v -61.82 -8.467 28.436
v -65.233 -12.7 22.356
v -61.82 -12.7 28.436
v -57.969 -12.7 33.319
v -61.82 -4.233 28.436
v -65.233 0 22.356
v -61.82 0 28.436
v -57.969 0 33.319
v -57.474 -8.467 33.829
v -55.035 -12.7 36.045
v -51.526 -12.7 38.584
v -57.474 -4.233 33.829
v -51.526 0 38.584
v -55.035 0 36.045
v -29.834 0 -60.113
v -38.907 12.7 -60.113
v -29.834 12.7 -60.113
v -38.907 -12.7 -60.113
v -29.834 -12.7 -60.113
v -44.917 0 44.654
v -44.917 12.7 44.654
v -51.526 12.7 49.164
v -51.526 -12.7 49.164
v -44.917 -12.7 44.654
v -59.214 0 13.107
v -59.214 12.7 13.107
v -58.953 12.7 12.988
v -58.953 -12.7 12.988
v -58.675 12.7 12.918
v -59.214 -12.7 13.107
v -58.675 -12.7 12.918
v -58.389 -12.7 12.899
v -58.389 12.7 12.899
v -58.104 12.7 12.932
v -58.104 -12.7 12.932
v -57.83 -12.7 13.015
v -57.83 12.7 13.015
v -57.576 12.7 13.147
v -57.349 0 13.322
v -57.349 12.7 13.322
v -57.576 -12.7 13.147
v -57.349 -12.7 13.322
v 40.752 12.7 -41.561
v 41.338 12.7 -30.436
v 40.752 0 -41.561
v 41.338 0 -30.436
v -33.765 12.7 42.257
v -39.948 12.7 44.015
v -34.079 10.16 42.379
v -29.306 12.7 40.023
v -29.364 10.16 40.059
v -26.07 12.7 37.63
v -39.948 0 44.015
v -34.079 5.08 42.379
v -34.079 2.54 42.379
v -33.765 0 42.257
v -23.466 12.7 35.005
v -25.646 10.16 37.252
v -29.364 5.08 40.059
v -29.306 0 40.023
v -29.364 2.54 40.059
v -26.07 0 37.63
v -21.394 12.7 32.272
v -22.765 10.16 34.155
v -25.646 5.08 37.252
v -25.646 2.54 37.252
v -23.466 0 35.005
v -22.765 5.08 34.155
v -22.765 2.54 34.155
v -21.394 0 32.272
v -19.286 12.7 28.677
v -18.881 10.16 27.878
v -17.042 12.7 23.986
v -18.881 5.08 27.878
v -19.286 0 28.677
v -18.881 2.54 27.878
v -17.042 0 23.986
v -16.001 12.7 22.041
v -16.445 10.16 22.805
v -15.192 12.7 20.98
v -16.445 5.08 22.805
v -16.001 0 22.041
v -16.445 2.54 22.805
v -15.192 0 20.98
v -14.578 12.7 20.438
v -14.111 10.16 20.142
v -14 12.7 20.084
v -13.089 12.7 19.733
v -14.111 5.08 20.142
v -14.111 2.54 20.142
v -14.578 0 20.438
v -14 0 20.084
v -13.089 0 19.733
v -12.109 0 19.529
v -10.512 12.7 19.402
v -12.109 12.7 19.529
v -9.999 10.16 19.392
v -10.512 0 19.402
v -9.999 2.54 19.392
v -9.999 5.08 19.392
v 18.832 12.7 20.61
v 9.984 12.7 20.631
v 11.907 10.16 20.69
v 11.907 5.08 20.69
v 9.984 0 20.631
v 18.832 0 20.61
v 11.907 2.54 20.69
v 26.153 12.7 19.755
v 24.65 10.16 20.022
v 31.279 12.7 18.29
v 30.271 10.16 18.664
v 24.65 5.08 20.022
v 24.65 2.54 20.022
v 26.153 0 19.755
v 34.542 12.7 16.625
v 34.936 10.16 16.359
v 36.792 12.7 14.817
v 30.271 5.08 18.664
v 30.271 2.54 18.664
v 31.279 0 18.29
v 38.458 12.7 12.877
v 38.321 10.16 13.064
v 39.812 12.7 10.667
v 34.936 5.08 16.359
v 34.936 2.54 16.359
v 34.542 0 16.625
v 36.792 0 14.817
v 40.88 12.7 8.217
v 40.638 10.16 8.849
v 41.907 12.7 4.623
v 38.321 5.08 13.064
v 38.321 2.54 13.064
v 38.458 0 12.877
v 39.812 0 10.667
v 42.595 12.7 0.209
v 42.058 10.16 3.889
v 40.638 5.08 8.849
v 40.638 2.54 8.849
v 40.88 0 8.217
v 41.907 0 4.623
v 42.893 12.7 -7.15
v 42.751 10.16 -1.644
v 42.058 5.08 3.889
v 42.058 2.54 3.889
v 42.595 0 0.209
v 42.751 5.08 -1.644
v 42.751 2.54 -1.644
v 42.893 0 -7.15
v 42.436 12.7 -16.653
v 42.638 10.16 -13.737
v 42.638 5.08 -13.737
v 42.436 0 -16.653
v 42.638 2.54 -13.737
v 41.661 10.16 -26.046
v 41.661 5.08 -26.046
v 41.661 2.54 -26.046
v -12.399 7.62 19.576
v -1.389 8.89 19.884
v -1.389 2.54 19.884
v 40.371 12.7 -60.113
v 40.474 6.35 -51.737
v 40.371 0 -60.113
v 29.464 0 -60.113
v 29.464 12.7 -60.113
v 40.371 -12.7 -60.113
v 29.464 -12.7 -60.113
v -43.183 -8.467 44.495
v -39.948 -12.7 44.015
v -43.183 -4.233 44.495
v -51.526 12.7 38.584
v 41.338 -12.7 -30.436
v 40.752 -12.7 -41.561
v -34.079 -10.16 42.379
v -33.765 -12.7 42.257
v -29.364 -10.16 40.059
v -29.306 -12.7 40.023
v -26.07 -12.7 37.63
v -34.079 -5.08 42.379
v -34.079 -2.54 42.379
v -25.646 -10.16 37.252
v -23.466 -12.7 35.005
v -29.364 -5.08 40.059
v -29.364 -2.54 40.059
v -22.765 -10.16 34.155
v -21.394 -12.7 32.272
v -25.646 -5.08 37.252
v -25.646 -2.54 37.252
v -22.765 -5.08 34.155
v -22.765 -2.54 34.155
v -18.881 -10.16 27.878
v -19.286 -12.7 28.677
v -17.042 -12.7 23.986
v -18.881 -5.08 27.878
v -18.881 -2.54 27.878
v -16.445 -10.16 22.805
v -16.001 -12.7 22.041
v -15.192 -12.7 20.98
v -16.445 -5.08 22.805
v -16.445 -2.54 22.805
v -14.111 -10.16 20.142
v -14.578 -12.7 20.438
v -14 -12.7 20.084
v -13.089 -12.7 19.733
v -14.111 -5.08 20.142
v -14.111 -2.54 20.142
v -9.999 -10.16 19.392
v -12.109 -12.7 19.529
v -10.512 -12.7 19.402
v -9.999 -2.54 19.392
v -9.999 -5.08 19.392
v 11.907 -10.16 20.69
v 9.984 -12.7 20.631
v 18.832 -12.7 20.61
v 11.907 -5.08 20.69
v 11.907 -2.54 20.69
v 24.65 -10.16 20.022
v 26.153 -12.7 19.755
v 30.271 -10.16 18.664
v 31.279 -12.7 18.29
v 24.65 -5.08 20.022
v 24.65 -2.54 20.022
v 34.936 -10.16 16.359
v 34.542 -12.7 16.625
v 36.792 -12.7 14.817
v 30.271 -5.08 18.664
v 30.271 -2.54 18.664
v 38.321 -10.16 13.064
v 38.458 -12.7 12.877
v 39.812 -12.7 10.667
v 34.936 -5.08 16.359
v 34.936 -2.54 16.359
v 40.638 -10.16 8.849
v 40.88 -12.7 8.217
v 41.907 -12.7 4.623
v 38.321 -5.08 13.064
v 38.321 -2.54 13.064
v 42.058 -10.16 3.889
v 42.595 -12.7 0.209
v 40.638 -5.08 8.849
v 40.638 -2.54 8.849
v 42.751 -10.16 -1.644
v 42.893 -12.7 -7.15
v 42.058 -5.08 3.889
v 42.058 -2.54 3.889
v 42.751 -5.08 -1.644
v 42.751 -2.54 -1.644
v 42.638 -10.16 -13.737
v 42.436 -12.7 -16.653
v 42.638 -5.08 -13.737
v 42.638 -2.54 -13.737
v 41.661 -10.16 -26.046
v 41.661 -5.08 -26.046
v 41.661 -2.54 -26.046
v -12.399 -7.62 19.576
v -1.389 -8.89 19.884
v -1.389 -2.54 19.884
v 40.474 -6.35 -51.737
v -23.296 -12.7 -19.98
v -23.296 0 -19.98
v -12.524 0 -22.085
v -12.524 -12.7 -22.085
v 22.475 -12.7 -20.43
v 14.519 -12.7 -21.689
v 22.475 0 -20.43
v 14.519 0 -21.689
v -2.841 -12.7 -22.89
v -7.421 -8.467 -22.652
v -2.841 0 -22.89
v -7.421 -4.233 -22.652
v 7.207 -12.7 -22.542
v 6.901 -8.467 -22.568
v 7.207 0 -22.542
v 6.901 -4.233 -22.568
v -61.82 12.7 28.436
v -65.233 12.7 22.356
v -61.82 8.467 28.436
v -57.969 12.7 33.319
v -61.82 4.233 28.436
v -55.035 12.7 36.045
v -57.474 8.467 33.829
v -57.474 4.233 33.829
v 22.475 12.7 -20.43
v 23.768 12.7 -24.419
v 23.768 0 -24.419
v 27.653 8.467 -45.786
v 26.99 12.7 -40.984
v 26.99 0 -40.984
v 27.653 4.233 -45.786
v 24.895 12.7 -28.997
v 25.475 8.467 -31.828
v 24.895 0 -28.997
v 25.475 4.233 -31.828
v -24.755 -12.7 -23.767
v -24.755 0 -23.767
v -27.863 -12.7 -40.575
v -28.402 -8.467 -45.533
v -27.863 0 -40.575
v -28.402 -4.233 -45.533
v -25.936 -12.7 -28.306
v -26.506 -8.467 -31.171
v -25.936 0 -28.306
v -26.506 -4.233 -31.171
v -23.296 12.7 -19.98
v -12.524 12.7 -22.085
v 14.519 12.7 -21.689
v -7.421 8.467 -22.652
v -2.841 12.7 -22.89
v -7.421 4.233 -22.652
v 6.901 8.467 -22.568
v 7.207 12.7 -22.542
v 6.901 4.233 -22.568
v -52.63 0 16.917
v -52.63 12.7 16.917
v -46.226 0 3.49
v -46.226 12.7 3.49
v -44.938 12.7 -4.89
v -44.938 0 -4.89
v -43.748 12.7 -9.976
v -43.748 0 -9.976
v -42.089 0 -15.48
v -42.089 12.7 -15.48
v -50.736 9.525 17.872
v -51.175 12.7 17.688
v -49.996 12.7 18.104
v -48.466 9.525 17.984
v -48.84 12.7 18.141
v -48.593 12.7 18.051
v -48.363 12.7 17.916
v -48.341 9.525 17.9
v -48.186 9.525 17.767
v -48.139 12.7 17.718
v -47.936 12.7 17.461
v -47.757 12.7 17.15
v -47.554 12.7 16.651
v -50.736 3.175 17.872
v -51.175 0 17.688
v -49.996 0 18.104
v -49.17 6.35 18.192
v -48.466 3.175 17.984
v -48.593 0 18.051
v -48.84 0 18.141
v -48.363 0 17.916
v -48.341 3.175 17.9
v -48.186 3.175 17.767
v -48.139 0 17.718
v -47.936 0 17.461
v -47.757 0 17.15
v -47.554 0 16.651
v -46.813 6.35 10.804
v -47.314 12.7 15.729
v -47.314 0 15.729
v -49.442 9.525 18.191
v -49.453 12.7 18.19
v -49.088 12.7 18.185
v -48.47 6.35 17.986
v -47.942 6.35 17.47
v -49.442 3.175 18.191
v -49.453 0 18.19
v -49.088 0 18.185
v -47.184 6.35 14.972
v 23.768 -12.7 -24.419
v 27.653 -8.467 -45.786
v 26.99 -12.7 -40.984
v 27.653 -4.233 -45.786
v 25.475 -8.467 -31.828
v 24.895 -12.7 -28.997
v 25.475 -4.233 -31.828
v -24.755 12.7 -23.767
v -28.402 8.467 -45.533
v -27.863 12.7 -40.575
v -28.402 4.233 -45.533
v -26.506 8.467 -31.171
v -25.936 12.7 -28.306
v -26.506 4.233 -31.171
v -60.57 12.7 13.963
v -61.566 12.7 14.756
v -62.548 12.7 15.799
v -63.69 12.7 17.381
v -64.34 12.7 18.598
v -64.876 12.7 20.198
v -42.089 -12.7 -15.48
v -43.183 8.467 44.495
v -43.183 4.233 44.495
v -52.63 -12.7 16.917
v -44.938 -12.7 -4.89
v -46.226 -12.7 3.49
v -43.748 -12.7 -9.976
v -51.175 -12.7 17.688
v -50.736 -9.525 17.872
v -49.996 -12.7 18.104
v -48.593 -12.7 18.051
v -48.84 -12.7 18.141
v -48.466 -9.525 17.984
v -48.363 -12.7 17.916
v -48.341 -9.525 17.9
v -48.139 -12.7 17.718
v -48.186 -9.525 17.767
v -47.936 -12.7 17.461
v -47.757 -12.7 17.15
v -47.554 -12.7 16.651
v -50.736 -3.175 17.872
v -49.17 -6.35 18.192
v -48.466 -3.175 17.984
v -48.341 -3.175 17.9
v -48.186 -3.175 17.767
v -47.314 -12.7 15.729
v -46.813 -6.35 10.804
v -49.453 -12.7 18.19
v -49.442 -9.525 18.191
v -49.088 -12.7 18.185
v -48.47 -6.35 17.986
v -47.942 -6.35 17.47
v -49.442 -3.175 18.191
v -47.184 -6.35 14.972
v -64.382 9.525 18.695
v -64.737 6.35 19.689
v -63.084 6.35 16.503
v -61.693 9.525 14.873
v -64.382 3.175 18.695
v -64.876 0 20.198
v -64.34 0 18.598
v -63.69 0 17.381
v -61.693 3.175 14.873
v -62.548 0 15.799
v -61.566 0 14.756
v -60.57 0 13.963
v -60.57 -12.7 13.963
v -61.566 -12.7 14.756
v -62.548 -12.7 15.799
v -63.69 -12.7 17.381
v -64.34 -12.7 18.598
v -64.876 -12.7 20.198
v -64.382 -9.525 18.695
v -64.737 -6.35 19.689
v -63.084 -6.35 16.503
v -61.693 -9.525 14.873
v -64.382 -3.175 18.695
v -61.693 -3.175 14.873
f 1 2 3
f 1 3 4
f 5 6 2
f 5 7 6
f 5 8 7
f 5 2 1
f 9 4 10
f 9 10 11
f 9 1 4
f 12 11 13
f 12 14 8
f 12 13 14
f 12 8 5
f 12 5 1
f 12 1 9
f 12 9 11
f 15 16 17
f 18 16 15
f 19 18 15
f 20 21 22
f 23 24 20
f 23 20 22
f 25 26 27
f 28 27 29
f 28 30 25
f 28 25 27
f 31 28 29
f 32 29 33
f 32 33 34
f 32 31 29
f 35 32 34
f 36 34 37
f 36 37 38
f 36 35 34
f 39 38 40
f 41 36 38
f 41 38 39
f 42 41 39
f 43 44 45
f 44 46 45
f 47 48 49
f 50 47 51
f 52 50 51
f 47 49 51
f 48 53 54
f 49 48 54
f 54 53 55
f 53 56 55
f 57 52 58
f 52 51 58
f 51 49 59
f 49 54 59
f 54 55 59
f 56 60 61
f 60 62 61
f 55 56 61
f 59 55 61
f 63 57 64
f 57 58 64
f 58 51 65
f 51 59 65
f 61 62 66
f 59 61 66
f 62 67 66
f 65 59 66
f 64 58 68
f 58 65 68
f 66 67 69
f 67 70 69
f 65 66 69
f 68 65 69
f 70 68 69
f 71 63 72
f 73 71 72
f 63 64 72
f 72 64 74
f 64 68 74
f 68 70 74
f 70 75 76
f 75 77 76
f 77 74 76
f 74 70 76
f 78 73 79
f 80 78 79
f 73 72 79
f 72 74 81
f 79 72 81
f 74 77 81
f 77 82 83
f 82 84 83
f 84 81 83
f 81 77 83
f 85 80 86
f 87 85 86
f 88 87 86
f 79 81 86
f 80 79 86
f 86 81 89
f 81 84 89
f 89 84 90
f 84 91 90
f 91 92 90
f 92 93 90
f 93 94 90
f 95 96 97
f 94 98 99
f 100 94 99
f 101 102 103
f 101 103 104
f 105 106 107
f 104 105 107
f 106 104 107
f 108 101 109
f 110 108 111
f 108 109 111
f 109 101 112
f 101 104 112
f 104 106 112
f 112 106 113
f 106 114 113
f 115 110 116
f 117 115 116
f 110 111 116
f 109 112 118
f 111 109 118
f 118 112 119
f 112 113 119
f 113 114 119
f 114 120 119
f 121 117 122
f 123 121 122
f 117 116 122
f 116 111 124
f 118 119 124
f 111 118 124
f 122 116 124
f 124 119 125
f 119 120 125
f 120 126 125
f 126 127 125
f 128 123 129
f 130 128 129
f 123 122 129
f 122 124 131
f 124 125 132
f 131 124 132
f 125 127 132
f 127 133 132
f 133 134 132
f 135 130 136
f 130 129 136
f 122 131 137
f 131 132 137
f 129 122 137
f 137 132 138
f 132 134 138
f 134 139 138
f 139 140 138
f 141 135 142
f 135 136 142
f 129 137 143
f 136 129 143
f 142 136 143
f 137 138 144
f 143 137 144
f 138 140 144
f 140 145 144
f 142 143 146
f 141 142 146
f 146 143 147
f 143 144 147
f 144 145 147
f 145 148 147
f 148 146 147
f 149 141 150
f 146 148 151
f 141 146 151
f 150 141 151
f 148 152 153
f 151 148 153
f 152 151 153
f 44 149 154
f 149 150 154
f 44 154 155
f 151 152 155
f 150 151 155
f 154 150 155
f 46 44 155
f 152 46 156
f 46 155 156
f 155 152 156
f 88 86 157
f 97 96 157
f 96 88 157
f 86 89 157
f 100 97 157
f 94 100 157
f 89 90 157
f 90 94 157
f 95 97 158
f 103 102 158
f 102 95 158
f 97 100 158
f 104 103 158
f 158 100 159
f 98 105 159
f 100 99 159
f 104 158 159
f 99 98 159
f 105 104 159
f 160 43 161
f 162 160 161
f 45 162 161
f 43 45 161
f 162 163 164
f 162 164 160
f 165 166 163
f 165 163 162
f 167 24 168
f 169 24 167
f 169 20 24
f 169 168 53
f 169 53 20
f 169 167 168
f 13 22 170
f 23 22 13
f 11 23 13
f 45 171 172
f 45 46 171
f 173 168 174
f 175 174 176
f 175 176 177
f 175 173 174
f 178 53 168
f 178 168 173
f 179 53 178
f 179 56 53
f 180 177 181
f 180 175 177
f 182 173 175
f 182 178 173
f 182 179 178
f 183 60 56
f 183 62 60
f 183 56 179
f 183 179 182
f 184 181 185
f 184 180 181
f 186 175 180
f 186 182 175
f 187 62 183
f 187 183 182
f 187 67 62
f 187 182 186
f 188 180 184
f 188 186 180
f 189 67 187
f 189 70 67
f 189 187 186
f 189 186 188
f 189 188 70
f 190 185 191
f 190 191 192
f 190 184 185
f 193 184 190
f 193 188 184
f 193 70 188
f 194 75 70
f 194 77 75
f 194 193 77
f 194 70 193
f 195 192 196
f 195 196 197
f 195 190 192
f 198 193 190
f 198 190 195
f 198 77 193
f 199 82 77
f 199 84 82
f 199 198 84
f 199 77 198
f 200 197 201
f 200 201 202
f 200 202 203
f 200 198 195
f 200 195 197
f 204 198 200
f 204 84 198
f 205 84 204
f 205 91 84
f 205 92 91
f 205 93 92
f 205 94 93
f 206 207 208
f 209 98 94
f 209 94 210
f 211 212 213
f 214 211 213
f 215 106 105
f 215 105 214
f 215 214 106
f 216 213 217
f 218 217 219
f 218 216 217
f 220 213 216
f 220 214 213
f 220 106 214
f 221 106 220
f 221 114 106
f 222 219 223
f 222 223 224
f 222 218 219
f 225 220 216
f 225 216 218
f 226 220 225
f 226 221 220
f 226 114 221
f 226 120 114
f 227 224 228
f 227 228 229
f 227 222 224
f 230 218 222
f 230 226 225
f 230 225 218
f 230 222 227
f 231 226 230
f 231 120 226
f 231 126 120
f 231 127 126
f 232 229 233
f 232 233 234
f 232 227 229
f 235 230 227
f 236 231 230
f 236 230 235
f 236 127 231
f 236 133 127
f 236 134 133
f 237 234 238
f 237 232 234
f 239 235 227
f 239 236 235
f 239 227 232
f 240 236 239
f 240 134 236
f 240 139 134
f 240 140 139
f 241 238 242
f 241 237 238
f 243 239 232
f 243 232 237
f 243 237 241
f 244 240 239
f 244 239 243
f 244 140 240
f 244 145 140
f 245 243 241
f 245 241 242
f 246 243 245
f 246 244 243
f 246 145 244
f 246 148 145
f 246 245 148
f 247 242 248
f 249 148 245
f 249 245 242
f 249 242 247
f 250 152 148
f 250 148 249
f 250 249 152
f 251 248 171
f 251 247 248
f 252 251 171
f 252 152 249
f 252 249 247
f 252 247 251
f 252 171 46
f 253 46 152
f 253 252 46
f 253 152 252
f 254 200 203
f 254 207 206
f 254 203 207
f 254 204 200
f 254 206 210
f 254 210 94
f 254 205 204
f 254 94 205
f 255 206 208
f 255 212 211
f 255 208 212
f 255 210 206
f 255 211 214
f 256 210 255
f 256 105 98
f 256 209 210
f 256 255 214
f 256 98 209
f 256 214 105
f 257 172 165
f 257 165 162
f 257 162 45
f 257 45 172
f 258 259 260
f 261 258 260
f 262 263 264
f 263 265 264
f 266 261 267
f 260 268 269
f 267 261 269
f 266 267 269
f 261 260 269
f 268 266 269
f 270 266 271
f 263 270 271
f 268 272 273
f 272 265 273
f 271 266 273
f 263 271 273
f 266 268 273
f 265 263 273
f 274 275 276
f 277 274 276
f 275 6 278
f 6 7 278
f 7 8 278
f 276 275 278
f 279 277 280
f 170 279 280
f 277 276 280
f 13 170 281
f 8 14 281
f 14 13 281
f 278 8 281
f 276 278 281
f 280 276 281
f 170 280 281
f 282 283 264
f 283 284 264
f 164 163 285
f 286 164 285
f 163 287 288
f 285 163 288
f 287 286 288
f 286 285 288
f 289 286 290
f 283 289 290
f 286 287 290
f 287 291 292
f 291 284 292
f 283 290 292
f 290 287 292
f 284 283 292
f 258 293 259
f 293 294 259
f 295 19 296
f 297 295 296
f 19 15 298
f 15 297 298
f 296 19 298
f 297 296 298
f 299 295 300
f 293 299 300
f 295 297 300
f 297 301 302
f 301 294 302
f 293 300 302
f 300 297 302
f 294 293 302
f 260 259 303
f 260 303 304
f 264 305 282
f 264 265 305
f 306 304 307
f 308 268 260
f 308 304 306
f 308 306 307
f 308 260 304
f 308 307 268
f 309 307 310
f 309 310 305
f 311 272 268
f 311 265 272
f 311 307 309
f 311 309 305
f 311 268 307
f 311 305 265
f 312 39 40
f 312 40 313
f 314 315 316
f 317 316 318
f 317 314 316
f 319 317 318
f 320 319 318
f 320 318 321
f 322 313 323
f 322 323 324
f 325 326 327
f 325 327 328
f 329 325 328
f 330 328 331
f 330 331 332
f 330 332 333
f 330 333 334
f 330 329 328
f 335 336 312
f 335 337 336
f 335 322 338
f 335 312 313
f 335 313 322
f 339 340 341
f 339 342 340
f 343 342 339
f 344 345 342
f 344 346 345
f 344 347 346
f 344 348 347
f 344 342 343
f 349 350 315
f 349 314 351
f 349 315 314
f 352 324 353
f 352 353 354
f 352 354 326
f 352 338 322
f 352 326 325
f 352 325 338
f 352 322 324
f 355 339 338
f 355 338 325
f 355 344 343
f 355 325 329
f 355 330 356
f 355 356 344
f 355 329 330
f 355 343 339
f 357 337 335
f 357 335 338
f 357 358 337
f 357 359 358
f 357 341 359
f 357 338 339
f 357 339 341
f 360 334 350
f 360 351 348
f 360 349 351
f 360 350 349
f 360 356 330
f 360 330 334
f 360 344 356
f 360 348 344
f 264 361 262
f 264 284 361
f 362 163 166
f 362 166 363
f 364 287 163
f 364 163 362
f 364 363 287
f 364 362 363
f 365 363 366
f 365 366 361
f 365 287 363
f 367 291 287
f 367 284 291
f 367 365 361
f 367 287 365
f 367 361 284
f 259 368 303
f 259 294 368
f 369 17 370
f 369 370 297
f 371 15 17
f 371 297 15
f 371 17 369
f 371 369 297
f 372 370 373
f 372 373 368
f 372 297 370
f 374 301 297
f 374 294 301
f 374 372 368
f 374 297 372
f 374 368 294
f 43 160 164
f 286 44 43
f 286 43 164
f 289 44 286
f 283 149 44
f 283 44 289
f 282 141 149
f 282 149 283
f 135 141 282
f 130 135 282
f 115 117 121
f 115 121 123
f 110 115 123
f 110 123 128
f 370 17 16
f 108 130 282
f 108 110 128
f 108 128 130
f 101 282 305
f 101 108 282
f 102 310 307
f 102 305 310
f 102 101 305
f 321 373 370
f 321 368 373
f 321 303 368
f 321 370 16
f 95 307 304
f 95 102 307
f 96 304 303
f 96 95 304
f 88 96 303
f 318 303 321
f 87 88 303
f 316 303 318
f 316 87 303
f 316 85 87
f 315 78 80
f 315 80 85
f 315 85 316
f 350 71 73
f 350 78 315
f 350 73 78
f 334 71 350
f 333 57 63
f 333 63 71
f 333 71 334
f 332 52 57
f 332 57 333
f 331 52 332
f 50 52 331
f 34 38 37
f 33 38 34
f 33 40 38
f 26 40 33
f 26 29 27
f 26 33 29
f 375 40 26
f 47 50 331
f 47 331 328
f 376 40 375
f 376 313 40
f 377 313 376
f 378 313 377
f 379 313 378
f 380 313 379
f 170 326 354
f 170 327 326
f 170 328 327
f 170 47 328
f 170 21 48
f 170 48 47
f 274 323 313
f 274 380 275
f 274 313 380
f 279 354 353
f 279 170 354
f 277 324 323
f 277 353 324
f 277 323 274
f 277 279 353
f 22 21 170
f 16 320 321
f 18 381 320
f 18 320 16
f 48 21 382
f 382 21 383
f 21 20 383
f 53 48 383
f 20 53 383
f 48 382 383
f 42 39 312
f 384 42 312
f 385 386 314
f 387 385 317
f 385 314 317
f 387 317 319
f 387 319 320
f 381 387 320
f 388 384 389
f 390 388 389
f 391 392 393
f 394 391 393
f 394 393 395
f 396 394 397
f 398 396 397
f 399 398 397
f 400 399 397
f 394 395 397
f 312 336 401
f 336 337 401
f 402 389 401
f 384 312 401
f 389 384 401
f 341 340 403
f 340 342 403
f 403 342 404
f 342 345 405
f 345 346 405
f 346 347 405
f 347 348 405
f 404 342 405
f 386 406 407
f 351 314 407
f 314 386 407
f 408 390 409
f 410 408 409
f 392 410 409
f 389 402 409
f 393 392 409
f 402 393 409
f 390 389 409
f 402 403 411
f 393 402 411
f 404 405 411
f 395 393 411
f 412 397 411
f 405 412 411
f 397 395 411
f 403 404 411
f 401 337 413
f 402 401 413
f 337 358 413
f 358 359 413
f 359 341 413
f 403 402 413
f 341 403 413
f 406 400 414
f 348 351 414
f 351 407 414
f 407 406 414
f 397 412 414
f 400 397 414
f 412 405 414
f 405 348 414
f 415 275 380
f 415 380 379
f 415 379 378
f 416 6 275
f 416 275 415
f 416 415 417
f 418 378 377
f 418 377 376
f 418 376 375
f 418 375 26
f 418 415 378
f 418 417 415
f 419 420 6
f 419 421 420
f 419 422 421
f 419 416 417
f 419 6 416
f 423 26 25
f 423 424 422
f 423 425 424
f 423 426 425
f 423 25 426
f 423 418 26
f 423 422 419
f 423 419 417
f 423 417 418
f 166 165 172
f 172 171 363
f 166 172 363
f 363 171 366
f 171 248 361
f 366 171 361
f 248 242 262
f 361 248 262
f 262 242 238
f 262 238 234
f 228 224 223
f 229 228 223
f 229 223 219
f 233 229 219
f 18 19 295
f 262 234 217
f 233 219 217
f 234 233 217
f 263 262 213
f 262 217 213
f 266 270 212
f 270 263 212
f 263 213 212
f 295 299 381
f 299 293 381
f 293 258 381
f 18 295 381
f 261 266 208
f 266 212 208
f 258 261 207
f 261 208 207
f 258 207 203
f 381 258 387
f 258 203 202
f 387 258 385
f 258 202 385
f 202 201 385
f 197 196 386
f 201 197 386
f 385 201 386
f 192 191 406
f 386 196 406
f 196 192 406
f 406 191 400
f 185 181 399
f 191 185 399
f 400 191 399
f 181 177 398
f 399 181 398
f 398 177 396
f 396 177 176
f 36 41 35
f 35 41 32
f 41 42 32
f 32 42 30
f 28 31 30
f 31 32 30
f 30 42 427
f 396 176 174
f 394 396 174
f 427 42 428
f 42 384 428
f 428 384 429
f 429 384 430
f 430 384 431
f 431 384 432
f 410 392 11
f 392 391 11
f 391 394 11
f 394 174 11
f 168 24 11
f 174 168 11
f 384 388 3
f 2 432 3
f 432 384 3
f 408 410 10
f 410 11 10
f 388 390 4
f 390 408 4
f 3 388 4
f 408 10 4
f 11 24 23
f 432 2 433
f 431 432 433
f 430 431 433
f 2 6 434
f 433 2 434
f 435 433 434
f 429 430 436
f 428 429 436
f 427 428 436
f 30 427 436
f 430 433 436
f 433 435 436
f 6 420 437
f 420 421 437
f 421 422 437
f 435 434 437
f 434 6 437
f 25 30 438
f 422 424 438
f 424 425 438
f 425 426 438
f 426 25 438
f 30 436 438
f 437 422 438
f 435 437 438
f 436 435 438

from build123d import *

# Parameters (mm, degrees)
F1_DEPTH = 12.7


with BuildPart() as f1:
    # F0 (on Front) → F1 (new body, symmetric)
    with BuildSketch(Plane.XZ):
        with BuildLine():
            add(Edge.make_bspline(
                [(29.4644571841, -60.1132586598), (27.6855829591, -46.3318706801), (26.0364115238, -29.8171713948), (22.4748793989, -20.4304866493)],
                knots=[0, 0, 0, 0, 40.2936296709, 40.2936296709, 40.2936296709, 40.2936296709], degree=3))
            Line((29.4644571841, -60.1132586598), (40.3708852828, -60.1132586598))
            add(Edge.make_bspline(
                [(-39.9478672487, 44.0147390983), (-22.6170819874, 40.7392920594), (-17.6583308267, 21.8449652817), (-10.5823233679, 17.4452892369), (48.2060896937, 28.4705173137), (40.6121053954, -27.0892647533), (40.4531992639, -51.9750322816), (40.3708852828, -60.1132586598)],
                knots=[0.0176141395, 0.0176141395, 0.0176141395, 0.0176141395, 0.2155433835, 0.3127139787, 0.5541696156, 0.7899221691, 1, 1, 1, 1], degree=3))
            add(Edge.make_bspline(
                [(-51.525823772, 38.5839095885), (-48.427228892, 40.5626276502), (-44.6559490871, 42.3665309751), (-39.9478672487, 44.0147390983)],
                knots=[23.1608101494, 23.1608101494, 23.1608101494, 23.1608101494, 33.4552840805, 33.4552840805, 33.4552840805, 33.4552840805], degree=3))
            add(Edge.make_bspline(
                [(-65.2326749397, 22.3562452086), (-62.0634924721, 28.7954880253), (-58.4971336441, 34.1321315111), (-51.525823772, 38.5839095885)],
                knots=[0, 0, 0, 0, 23.1608101494, 23.1608101494, 23.1608101494, 23.1608101494], degree=3))
            add(Edge.make_bspline(
                [(-65.2326749397, 22.3562452086), (-64.9142132763, 19.1417994226), (-63.1920002018, 16.5369528749), (-61.4708318004, 14.3936398975), (-59.2138856774, 13.1071134676)],
                knots=[0, 0, 0, 0, 0.4981667475, 0.9372778592, 0.9372778592, 0.9372778592, 0.9372778592], degree=3))
            ThreePointArc((-59.2138856774, 13.1071134676), (-58.2461064449, 12.9092024326), (-57.3486451177, 13.3219112729))
            add(Edge.make_bspline(
                [(-57.3486451177, 13.3219112729), (-55.1020312441, 15.4039535235), (-43.1513826069, 24.2493514779), (-49.0148457206, 5.0786043936), (-42.0894920826, -15.4795860872)],
                knots=[0.0422614145, 0.0422614145, 0.0422614145, 0.0422614145, 0.3570922222, 1, 1, 1, 1], degree=3))
            Line((-42.0894920826, -15.4795860872), (-38.9069225571, -60.1132586598))
            Line((-38.9069225571, -60.1132586598), (-29.8342294991, -60.1132586598))
            add(Edge.make_bspline(
                [(-29.8342294991, -60.1132586598), (-28.3491642525, -46.4075747877), (-27.4474639446, -28.6016501486), (-23.295590654, -19.9795458466)],
                knots=[0, 0, 0, 0, 40.6628663786, 40.6628663786, 40.6628663786, 40.6628663786], degree=3))
            add(Edge.make_bspline(
                [(-23.295590654, -19.9795458466), (-5.7089058682, -24.2634825408), (5.3391372785, -23.3616009355), (22.4748793989, -20.4304866493)],
                knots=[0, 0, 0, 0, 45.7726913834, 45.7726913834, 45.7726913834, 45.7726913834], degree=3))
        make_face()
        with BuildLine():
            add(Edge.make_bspline(
                [(-51.525823772, 38.5839095885), (-48.427228892, 40.5626276502), (-44.6559490871, 42.3665309751), (-39.9478672487, 44.0147390983)],
                knots=[23.1608101494, 23.1608101494, 23.1608101494, 23.1608101494, 33.4552840805, 33.4552840805, 33.4552840805, 33.4552840805], degree=3))
            add(Edge.make_bspline(
                [(-44.9170466202, 44.6540898628), (-43.143386035, 44.5232937495), (-41.4901702624, 44.306228016), (-39.9478672487, 44.0147390983)],
                knots=[0, 0, 0, 0, 0.0176141395, 0.0176141395, 0.0176141395, 0.0176141395], degree=3))
            Line((-44.9170466202, 44.6540898628), (-51.525823772, 49.1643957794))
            Line((-51.525823772, 49.1643957794), (-51.525823772, 38.5839095885))
        make_face()
    extrude(amount=F1_DEPTH, both=True)


solid = f1.part
